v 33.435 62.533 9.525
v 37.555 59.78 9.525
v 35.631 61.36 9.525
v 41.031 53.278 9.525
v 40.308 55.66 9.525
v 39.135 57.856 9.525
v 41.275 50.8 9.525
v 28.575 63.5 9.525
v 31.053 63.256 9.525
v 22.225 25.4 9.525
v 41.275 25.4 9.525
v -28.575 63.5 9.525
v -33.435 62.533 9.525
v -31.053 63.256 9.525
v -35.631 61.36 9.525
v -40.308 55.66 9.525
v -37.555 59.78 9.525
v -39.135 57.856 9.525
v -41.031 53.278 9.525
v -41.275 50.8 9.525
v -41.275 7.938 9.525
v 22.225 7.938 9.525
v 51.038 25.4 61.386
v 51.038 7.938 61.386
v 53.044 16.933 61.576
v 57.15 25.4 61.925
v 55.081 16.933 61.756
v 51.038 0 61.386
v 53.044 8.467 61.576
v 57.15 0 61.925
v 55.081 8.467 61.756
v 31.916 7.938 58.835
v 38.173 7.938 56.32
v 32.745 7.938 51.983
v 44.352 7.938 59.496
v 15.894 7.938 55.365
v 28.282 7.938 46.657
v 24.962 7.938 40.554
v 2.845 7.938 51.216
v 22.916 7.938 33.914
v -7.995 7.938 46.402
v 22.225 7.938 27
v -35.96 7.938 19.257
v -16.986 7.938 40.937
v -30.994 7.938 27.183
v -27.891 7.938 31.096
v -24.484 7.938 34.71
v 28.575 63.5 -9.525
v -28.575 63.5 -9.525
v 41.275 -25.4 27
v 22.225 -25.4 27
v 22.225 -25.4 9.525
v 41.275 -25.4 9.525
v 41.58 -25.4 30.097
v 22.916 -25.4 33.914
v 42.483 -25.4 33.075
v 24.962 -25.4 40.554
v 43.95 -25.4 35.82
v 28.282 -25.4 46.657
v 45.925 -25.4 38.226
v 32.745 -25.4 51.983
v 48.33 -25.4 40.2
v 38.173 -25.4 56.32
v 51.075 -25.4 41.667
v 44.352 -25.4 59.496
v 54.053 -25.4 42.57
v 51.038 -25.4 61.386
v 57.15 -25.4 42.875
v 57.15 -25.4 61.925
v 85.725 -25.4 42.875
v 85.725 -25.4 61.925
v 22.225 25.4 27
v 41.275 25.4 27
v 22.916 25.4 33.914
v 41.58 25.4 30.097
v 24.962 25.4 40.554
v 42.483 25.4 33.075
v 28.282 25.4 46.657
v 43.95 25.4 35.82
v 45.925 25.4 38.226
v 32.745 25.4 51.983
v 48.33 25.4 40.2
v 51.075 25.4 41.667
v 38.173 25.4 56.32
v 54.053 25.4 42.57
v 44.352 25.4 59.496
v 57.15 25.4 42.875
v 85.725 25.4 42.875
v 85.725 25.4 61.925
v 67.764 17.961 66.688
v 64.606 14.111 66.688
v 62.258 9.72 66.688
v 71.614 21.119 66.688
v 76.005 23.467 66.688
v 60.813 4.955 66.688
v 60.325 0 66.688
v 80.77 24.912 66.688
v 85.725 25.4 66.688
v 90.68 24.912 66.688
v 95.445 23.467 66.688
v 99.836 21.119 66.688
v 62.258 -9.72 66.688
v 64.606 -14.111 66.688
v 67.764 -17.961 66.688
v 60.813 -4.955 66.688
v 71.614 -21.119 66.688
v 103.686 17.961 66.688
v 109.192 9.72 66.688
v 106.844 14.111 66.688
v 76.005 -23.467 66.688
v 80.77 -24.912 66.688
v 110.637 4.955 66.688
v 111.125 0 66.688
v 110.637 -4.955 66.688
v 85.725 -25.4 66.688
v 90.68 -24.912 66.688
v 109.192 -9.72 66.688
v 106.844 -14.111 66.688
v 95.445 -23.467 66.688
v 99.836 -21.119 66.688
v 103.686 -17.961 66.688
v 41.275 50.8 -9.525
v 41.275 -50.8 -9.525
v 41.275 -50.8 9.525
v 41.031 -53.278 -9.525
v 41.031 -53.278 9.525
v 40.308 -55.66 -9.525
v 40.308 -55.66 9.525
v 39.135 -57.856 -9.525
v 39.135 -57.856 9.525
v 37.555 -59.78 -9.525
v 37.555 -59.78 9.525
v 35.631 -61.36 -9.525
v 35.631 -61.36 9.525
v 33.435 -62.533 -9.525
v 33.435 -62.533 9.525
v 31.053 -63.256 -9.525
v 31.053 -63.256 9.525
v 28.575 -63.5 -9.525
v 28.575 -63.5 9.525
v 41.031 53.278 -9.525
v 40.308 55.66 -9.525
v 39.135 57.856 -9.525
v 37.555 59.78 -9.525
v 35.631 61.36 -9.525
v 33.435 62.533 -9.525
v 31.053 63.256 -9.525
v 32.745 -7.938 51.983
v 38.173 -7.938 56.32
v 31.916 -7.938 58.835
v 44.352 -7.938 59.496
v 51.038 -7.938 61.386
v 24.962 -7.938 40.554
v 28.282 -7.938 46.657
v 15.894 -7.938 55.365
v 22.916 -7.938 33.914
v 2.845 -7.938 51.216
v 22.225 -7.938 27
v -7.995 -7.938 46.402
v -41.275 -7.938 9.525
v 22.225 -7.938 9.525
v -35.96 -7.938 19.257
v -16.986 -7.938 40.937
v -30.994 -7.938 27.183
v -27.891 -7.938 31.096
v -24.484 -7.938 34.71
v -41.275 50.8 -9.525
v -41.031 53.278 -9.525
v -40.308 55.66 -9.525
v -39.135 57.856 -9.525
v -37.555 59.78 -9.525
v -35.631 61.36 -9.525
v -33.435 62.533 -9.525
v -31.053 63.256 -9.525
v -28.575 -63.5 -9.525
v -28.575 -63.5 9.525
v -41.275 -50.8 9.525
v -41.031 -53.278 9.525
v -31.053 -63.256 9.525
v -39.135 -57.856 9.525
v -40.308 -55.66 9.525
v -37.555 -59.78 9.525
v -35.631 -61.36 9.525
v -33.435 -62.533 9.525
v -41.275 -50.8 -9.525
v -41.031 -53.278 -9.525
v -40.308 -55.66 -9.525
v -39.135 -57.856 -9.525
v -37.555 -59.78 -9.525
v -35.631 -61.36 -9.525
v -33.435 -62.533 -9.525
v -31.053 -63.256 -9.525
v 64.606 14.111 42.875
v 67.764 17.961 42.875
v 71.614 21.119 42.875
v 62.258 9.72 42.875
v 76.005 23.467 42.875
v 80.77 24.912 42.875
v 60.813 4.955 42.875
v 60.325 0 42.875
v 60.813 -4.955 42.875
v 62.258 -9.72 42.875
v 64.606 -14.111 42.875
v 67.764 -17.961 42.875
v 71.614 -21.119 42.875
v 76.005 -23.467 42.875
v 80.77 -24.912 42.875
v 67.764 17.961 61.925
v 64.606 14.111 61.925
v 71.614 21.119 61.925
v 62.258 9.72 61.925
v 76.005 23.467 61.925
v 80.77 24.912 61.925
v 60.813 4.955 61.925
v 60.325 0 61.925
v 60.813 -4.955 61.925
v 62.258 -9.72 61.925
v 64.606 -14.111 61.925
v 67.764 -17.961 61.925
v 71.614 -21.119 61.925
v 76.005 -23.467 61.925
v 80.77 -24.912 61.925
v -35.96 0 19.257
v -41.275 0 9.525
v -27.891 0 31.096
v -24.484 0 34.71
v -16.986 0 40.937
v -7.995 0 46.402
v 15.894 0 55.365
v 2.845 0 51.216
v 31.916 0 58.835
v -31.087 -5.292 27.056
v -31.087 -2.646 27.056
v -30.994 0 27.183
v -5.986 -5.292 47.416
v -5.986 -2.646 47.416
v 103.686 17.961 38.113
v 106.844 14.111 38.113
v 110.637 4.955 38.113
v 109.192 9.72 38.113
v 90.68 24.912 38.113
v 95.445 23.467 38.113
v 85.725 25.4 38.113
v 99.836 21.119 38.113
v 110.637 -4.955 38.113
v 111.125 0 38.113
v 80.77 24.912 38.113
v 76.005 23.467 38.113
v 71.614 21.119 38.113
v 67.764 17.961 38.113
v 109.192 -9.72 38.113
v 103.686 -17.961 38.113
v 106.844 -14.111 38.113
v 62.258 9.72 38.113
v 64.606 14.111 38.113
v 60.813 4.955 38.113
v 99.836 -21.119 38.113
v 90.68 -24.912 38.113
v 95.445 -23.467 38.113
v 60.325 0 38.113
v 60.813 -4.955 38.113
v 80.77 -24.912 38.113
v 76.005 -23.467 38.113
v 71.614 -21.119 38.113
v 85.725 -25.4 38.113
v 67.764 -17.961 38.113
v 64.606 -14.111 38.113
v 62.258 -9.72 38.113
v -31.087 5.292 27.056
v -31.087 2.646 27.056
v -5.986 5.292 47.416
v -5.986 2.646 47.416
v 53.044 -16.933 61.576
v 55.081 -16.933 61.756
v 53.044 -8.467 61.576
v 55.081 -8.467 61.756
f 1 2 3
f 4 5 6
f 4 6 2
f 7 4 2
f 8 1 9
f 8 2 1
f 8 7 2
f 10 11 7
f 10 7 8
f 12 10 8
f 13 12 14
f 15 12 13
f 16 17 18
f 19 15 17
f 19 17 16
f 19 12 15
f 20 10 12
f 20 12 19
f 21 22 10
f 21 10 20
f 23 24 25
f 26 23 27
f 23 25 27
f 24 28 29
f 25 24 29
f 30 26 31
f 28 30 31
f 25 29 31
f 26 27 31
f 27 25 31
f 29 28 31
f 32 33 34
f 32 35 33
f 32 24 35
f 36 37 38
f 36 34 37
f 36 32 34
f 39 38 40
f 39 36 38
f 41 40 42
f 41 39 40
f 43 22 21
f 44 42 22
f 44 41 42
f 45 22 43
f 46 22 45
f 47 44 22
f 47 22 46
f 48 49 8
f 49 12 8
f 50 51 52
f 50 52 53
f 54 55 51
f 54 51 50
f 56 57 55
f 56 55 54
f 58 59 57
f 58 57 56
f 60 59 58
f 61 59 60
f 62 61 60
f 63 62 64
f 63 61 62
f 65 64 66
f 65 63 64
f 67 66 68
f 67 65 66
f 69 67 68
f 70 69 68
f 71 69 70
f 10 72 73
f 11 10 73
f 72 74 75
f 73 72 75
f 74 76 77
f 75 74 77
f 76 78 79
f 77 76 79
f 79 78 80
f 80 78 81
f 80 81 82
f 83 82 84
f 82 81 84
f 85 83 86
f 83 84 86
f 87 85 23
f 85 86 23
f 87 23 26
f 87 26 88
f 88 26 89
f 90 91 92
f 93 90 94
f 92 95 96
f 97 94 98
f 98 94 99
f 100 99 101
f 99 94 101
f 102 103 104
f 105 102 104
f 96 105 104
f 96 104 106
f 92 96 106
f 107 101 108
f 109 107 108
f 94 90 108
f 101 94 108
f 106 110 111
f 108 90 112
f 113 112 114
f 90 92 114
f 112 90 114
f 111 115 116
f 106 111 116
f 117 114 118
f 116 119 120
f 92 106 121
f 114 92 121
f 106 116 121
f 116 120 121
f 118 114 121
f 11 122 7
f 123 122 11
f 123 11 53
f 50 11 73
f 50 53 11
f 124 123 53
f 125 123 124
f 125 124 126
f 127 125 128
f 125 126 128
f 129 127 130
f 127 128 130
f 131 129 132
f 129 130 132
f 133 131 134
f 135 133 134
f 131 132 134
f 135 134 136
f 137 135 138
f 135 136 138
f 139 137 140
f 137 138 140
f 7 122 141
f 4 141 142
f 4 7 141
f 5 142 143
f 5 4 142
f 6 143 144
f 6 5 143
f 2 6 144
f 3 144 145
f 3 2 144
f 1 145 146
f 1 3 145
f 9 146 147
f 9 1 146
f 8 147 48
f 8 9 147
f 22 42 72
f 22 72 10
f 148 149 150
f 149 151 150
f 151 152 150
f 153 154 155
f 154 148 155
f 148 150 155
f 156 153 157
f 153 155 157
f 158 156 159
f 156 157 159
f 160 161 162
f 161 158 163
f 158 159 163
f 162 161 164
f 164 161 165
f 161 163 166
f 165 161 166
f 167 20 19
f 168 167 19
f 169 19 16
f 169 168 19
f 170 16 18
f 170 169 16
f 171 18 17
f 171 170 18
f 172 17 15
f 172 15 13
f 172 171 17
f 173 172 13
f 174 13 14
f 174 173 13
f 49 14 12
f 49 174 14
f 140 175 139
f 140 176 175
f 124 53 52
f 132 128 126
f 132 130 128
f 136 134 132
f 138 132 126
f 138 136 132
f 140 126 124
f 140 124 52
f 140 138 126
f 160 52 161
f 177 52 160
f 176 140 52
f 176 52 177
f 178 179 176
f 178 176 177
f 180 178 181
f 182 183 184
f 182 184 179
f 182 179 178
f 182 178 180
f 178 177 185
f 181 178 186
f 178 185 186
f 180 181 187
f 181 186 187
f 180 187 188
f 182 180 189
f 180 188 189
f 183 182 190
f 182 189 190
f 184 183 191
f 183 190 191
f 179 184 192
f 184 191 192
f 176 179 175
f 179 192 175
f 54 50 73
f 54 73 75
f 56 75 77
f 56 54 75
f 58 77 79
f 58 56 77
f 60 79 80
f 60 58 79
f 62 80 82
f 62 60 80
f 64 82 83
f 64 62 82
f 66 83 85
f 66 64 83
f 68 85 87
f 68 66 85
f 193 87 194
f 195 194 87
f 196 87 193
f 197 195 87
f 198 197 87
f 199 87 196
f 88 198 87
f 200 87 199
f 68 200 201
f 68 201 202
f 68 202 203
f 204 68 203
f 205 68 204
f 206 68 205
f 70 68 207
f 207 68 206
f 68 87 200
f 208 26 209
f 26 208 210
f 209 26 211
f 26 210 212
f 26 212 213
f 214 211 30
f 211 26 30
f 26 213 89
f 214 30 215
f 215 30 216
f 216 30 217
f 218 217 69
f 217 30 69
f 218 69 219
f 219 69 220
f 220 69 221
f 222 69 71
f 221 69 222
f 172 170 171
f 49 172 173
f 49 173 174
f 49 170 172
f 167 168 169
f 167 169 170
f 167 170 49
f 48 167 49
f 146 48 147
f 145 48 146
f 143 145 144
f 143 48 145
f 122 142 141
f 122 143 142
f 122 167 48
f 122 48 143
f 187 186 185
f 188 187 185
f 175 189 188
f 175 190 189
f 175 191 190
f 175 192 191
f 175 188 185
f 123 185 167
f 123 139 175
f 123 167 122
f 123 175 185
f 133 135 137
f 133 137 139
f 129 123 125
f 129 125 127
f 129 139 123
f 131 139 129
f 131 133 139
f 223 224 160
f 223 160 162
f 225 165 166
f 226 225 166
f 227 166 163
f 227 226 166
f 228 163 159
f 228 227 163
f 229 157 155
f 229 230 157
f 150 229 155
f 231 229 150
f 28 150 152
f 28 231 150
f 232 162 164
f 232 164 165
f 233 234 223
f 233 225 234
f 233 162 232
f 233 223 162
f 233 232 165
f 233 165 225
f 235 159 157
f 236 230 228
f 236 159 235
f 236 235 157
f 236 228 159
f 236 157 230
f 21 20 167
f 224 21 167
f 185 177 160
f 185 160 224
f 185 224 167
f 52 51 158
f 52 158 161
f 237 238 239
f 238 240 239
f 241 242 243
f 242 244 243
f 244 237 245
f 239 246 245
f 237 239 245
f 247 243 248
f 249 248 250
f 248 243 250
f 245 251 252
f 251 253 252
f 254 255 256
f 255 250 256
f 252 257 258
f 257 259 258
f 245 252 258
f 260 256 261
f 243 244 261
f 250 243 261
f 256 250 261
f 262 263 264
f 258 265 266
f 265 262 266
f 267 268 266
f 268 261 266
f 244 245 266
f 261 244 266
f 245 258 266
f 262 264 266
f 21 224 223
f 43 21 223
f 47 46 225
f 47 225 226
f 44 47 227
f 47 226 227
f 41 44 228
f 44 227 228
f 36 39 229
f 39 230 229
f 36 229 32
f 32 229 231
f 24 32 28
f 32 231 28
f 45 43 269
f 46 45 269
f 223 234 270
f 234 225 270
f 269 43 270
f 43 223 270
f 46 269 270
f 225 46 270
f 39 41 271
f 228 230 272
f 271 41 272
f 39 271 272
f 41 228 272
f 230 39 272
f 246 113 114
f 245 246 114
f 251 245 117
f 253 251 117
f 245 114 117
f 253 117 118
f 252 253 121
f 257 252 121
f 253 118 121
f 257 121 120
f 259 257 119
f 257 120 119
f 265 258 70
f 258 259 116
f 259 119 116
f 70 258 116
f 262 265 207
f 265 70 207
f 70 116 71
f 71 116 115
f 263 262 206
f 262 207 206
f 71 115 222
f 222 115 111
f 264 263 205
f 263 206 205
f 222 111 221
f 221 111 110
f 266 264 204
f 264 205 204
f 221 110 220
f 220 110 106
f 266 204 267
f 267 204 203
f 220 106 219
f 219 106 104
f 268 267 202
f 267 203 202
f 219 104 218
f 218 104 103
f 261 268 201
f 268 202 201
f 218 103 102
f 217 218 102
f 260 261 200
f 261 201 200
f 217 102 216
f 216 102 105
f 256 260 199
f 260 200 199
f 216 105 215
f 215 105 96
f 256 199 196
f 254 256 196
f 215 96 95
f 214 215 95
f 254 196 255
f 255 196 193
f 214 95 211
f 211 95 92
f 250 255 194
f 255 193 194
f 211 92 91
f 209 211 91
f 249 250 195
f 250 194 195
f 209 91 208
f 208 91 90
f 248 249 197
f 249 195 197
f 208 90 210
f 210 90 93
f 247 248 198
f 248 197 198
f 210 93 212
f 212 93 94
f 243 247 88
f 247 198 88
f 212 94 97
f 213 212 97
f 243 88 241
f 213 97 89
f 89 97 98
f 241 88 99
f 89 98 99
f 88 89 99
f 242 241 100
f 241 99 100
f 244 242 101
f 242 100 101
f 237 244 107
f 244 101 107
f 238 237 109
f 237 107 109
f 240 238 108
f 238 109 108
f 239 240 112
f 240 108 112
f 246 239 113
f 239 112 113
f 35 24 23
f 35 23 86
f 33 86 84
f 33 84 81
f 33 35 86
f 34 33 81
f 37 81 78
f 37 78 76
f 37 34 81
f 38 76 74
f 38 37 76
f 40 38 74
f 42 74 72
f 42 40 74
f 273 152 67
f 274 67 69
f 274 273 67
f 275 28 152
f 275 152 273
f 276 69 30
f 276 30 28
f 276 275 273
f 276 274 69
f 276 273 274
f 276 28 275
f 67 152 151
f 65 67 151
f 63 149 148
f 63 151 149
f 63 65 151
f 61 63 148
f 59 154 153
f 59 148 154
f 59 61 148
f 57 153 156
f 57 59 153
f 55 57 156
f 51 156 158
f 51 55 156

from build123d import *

# Parameters (mm, degrees)
F1_DEPTH = 63.5
F2_DEPTH = 25.4
F0_W     = 25.4
F0_H     = 19.05
F3_DEPTH = 25.4
F4_DEPTH = 7.9375
F5_DEPTH = 25.4
F7_R     = 12.7


with BuildPart() as f1:
    # F0 (on Front) → F1 (new body, symmetric)
    with BuildSketch(Plane.XZ):
        Polygon((22.225, 9.525), (-41.275, 9.525), (-41.275, -9.525), (41.275, -9.525), (41.275, 9.525), align=None)
    extrude(amount=F1_DEPTH, both=True)

    # F0 (on Front) → F2 (join, symmetric)
    with BuildSketch(Plane.XZ):
        with BuildLine():
            Line((22.225, 27.0002), (22.225, 9.525))
            Line((22.225, 9.525), (41.275, 9.525))
            Line((41.275, 9.525), (41.275, 27.0002))
            ThreePointArc((41.275, 27.0002), (45.92468, 38.22552), (57.15, 42.8752))
            Line((57.15, 42.8752), (60.325, 42.8752))
            Line((60.325, 42.8752), (60.325, 61.9252))
            Line((60.325, 61.9252), (57.15, 61.9252))
            add(Edge.make_bspline(
                [(51.038245, 61.386274), (53.028106, 61.581124), (55.064944, 61.76099), (57.15, 61.9252)],
                knots=[108.753327, 108.753327, 108.753327, 108.753327, 111.504536, 111.504536, 111.504536, 111.504536], degree=3))
            ThreePointArc((51.038245, 61.386274), (30.380534, 49.431234), (22.225, 27.0002))
        make_face()
    extrude(amount=F2_DEPTH, both=True)

    # F0 (on Front) → F3 (join, symmetric)
    with BuildSketch(Plane.XZ):
        with Locations((73.025, 52.4002)):
            Rectangle(F0_W, F0_H)
    extrude(amount=F3_DEPTH, both=True)

    # F0 (on Front) → F4 (join, symmetric)
    with BuildSketch(Plane.XZ):
        with BuildLine():
            add(Edge.make_bspline(
                [(-41.275, 9.525), (-32.871462, 22.567717), (-27.619523, 53.683983), (51.038245, 61.386274)],
                knots=[0, 0, 0, 0, 108.753327, 108.753327, 108.753327, 108.753327], degree=3))
            Line((-41.275, 9.525), (22.225, 9.525))
            Line((22.225, 9.525), (22.225, 27.0002))
            ThreePointArc((22.225, 27.0002), (30.380534, 49.431234), (51.038245, 61.386274))
        make_face()
    extrude(amount=F4_DEPTH, both=True)

    # F0 (on Front) → F5 (join, symmetric)
    with BuildSketch(Plane.XZ):
        with Locations((73.025, 52.4002)):
            Rectangle(F0_W, F0_H)
    extrude(amount=F5_DEPTH, both=True)

    # F0 (on Front) → F6 (revolve)
    with BuildSketch(Plane.XZ):
        Polygon((85.725, 66.6877), (85.725, 61.9252), (85.725, 42.8752), (85.725, 38.1127), (111.125, 38.1127), (111.125, 66.6877), align=None)
    revolve(axis=Axis((85.725, 0, 52.4002), (0, 0, -1)))

    # F7
    f7_edges = [f1.edges().sort_by_distance(p)[0] for p in [
        (-41.275, -63.5, 0),
        (41.275, -63.5, 0),
        (41.275, 63.5, 0),
        (-41.275, 63.5, 0),
    ]]
    fillet(f7_edges, radius=F7_R)


solid = f1.part
